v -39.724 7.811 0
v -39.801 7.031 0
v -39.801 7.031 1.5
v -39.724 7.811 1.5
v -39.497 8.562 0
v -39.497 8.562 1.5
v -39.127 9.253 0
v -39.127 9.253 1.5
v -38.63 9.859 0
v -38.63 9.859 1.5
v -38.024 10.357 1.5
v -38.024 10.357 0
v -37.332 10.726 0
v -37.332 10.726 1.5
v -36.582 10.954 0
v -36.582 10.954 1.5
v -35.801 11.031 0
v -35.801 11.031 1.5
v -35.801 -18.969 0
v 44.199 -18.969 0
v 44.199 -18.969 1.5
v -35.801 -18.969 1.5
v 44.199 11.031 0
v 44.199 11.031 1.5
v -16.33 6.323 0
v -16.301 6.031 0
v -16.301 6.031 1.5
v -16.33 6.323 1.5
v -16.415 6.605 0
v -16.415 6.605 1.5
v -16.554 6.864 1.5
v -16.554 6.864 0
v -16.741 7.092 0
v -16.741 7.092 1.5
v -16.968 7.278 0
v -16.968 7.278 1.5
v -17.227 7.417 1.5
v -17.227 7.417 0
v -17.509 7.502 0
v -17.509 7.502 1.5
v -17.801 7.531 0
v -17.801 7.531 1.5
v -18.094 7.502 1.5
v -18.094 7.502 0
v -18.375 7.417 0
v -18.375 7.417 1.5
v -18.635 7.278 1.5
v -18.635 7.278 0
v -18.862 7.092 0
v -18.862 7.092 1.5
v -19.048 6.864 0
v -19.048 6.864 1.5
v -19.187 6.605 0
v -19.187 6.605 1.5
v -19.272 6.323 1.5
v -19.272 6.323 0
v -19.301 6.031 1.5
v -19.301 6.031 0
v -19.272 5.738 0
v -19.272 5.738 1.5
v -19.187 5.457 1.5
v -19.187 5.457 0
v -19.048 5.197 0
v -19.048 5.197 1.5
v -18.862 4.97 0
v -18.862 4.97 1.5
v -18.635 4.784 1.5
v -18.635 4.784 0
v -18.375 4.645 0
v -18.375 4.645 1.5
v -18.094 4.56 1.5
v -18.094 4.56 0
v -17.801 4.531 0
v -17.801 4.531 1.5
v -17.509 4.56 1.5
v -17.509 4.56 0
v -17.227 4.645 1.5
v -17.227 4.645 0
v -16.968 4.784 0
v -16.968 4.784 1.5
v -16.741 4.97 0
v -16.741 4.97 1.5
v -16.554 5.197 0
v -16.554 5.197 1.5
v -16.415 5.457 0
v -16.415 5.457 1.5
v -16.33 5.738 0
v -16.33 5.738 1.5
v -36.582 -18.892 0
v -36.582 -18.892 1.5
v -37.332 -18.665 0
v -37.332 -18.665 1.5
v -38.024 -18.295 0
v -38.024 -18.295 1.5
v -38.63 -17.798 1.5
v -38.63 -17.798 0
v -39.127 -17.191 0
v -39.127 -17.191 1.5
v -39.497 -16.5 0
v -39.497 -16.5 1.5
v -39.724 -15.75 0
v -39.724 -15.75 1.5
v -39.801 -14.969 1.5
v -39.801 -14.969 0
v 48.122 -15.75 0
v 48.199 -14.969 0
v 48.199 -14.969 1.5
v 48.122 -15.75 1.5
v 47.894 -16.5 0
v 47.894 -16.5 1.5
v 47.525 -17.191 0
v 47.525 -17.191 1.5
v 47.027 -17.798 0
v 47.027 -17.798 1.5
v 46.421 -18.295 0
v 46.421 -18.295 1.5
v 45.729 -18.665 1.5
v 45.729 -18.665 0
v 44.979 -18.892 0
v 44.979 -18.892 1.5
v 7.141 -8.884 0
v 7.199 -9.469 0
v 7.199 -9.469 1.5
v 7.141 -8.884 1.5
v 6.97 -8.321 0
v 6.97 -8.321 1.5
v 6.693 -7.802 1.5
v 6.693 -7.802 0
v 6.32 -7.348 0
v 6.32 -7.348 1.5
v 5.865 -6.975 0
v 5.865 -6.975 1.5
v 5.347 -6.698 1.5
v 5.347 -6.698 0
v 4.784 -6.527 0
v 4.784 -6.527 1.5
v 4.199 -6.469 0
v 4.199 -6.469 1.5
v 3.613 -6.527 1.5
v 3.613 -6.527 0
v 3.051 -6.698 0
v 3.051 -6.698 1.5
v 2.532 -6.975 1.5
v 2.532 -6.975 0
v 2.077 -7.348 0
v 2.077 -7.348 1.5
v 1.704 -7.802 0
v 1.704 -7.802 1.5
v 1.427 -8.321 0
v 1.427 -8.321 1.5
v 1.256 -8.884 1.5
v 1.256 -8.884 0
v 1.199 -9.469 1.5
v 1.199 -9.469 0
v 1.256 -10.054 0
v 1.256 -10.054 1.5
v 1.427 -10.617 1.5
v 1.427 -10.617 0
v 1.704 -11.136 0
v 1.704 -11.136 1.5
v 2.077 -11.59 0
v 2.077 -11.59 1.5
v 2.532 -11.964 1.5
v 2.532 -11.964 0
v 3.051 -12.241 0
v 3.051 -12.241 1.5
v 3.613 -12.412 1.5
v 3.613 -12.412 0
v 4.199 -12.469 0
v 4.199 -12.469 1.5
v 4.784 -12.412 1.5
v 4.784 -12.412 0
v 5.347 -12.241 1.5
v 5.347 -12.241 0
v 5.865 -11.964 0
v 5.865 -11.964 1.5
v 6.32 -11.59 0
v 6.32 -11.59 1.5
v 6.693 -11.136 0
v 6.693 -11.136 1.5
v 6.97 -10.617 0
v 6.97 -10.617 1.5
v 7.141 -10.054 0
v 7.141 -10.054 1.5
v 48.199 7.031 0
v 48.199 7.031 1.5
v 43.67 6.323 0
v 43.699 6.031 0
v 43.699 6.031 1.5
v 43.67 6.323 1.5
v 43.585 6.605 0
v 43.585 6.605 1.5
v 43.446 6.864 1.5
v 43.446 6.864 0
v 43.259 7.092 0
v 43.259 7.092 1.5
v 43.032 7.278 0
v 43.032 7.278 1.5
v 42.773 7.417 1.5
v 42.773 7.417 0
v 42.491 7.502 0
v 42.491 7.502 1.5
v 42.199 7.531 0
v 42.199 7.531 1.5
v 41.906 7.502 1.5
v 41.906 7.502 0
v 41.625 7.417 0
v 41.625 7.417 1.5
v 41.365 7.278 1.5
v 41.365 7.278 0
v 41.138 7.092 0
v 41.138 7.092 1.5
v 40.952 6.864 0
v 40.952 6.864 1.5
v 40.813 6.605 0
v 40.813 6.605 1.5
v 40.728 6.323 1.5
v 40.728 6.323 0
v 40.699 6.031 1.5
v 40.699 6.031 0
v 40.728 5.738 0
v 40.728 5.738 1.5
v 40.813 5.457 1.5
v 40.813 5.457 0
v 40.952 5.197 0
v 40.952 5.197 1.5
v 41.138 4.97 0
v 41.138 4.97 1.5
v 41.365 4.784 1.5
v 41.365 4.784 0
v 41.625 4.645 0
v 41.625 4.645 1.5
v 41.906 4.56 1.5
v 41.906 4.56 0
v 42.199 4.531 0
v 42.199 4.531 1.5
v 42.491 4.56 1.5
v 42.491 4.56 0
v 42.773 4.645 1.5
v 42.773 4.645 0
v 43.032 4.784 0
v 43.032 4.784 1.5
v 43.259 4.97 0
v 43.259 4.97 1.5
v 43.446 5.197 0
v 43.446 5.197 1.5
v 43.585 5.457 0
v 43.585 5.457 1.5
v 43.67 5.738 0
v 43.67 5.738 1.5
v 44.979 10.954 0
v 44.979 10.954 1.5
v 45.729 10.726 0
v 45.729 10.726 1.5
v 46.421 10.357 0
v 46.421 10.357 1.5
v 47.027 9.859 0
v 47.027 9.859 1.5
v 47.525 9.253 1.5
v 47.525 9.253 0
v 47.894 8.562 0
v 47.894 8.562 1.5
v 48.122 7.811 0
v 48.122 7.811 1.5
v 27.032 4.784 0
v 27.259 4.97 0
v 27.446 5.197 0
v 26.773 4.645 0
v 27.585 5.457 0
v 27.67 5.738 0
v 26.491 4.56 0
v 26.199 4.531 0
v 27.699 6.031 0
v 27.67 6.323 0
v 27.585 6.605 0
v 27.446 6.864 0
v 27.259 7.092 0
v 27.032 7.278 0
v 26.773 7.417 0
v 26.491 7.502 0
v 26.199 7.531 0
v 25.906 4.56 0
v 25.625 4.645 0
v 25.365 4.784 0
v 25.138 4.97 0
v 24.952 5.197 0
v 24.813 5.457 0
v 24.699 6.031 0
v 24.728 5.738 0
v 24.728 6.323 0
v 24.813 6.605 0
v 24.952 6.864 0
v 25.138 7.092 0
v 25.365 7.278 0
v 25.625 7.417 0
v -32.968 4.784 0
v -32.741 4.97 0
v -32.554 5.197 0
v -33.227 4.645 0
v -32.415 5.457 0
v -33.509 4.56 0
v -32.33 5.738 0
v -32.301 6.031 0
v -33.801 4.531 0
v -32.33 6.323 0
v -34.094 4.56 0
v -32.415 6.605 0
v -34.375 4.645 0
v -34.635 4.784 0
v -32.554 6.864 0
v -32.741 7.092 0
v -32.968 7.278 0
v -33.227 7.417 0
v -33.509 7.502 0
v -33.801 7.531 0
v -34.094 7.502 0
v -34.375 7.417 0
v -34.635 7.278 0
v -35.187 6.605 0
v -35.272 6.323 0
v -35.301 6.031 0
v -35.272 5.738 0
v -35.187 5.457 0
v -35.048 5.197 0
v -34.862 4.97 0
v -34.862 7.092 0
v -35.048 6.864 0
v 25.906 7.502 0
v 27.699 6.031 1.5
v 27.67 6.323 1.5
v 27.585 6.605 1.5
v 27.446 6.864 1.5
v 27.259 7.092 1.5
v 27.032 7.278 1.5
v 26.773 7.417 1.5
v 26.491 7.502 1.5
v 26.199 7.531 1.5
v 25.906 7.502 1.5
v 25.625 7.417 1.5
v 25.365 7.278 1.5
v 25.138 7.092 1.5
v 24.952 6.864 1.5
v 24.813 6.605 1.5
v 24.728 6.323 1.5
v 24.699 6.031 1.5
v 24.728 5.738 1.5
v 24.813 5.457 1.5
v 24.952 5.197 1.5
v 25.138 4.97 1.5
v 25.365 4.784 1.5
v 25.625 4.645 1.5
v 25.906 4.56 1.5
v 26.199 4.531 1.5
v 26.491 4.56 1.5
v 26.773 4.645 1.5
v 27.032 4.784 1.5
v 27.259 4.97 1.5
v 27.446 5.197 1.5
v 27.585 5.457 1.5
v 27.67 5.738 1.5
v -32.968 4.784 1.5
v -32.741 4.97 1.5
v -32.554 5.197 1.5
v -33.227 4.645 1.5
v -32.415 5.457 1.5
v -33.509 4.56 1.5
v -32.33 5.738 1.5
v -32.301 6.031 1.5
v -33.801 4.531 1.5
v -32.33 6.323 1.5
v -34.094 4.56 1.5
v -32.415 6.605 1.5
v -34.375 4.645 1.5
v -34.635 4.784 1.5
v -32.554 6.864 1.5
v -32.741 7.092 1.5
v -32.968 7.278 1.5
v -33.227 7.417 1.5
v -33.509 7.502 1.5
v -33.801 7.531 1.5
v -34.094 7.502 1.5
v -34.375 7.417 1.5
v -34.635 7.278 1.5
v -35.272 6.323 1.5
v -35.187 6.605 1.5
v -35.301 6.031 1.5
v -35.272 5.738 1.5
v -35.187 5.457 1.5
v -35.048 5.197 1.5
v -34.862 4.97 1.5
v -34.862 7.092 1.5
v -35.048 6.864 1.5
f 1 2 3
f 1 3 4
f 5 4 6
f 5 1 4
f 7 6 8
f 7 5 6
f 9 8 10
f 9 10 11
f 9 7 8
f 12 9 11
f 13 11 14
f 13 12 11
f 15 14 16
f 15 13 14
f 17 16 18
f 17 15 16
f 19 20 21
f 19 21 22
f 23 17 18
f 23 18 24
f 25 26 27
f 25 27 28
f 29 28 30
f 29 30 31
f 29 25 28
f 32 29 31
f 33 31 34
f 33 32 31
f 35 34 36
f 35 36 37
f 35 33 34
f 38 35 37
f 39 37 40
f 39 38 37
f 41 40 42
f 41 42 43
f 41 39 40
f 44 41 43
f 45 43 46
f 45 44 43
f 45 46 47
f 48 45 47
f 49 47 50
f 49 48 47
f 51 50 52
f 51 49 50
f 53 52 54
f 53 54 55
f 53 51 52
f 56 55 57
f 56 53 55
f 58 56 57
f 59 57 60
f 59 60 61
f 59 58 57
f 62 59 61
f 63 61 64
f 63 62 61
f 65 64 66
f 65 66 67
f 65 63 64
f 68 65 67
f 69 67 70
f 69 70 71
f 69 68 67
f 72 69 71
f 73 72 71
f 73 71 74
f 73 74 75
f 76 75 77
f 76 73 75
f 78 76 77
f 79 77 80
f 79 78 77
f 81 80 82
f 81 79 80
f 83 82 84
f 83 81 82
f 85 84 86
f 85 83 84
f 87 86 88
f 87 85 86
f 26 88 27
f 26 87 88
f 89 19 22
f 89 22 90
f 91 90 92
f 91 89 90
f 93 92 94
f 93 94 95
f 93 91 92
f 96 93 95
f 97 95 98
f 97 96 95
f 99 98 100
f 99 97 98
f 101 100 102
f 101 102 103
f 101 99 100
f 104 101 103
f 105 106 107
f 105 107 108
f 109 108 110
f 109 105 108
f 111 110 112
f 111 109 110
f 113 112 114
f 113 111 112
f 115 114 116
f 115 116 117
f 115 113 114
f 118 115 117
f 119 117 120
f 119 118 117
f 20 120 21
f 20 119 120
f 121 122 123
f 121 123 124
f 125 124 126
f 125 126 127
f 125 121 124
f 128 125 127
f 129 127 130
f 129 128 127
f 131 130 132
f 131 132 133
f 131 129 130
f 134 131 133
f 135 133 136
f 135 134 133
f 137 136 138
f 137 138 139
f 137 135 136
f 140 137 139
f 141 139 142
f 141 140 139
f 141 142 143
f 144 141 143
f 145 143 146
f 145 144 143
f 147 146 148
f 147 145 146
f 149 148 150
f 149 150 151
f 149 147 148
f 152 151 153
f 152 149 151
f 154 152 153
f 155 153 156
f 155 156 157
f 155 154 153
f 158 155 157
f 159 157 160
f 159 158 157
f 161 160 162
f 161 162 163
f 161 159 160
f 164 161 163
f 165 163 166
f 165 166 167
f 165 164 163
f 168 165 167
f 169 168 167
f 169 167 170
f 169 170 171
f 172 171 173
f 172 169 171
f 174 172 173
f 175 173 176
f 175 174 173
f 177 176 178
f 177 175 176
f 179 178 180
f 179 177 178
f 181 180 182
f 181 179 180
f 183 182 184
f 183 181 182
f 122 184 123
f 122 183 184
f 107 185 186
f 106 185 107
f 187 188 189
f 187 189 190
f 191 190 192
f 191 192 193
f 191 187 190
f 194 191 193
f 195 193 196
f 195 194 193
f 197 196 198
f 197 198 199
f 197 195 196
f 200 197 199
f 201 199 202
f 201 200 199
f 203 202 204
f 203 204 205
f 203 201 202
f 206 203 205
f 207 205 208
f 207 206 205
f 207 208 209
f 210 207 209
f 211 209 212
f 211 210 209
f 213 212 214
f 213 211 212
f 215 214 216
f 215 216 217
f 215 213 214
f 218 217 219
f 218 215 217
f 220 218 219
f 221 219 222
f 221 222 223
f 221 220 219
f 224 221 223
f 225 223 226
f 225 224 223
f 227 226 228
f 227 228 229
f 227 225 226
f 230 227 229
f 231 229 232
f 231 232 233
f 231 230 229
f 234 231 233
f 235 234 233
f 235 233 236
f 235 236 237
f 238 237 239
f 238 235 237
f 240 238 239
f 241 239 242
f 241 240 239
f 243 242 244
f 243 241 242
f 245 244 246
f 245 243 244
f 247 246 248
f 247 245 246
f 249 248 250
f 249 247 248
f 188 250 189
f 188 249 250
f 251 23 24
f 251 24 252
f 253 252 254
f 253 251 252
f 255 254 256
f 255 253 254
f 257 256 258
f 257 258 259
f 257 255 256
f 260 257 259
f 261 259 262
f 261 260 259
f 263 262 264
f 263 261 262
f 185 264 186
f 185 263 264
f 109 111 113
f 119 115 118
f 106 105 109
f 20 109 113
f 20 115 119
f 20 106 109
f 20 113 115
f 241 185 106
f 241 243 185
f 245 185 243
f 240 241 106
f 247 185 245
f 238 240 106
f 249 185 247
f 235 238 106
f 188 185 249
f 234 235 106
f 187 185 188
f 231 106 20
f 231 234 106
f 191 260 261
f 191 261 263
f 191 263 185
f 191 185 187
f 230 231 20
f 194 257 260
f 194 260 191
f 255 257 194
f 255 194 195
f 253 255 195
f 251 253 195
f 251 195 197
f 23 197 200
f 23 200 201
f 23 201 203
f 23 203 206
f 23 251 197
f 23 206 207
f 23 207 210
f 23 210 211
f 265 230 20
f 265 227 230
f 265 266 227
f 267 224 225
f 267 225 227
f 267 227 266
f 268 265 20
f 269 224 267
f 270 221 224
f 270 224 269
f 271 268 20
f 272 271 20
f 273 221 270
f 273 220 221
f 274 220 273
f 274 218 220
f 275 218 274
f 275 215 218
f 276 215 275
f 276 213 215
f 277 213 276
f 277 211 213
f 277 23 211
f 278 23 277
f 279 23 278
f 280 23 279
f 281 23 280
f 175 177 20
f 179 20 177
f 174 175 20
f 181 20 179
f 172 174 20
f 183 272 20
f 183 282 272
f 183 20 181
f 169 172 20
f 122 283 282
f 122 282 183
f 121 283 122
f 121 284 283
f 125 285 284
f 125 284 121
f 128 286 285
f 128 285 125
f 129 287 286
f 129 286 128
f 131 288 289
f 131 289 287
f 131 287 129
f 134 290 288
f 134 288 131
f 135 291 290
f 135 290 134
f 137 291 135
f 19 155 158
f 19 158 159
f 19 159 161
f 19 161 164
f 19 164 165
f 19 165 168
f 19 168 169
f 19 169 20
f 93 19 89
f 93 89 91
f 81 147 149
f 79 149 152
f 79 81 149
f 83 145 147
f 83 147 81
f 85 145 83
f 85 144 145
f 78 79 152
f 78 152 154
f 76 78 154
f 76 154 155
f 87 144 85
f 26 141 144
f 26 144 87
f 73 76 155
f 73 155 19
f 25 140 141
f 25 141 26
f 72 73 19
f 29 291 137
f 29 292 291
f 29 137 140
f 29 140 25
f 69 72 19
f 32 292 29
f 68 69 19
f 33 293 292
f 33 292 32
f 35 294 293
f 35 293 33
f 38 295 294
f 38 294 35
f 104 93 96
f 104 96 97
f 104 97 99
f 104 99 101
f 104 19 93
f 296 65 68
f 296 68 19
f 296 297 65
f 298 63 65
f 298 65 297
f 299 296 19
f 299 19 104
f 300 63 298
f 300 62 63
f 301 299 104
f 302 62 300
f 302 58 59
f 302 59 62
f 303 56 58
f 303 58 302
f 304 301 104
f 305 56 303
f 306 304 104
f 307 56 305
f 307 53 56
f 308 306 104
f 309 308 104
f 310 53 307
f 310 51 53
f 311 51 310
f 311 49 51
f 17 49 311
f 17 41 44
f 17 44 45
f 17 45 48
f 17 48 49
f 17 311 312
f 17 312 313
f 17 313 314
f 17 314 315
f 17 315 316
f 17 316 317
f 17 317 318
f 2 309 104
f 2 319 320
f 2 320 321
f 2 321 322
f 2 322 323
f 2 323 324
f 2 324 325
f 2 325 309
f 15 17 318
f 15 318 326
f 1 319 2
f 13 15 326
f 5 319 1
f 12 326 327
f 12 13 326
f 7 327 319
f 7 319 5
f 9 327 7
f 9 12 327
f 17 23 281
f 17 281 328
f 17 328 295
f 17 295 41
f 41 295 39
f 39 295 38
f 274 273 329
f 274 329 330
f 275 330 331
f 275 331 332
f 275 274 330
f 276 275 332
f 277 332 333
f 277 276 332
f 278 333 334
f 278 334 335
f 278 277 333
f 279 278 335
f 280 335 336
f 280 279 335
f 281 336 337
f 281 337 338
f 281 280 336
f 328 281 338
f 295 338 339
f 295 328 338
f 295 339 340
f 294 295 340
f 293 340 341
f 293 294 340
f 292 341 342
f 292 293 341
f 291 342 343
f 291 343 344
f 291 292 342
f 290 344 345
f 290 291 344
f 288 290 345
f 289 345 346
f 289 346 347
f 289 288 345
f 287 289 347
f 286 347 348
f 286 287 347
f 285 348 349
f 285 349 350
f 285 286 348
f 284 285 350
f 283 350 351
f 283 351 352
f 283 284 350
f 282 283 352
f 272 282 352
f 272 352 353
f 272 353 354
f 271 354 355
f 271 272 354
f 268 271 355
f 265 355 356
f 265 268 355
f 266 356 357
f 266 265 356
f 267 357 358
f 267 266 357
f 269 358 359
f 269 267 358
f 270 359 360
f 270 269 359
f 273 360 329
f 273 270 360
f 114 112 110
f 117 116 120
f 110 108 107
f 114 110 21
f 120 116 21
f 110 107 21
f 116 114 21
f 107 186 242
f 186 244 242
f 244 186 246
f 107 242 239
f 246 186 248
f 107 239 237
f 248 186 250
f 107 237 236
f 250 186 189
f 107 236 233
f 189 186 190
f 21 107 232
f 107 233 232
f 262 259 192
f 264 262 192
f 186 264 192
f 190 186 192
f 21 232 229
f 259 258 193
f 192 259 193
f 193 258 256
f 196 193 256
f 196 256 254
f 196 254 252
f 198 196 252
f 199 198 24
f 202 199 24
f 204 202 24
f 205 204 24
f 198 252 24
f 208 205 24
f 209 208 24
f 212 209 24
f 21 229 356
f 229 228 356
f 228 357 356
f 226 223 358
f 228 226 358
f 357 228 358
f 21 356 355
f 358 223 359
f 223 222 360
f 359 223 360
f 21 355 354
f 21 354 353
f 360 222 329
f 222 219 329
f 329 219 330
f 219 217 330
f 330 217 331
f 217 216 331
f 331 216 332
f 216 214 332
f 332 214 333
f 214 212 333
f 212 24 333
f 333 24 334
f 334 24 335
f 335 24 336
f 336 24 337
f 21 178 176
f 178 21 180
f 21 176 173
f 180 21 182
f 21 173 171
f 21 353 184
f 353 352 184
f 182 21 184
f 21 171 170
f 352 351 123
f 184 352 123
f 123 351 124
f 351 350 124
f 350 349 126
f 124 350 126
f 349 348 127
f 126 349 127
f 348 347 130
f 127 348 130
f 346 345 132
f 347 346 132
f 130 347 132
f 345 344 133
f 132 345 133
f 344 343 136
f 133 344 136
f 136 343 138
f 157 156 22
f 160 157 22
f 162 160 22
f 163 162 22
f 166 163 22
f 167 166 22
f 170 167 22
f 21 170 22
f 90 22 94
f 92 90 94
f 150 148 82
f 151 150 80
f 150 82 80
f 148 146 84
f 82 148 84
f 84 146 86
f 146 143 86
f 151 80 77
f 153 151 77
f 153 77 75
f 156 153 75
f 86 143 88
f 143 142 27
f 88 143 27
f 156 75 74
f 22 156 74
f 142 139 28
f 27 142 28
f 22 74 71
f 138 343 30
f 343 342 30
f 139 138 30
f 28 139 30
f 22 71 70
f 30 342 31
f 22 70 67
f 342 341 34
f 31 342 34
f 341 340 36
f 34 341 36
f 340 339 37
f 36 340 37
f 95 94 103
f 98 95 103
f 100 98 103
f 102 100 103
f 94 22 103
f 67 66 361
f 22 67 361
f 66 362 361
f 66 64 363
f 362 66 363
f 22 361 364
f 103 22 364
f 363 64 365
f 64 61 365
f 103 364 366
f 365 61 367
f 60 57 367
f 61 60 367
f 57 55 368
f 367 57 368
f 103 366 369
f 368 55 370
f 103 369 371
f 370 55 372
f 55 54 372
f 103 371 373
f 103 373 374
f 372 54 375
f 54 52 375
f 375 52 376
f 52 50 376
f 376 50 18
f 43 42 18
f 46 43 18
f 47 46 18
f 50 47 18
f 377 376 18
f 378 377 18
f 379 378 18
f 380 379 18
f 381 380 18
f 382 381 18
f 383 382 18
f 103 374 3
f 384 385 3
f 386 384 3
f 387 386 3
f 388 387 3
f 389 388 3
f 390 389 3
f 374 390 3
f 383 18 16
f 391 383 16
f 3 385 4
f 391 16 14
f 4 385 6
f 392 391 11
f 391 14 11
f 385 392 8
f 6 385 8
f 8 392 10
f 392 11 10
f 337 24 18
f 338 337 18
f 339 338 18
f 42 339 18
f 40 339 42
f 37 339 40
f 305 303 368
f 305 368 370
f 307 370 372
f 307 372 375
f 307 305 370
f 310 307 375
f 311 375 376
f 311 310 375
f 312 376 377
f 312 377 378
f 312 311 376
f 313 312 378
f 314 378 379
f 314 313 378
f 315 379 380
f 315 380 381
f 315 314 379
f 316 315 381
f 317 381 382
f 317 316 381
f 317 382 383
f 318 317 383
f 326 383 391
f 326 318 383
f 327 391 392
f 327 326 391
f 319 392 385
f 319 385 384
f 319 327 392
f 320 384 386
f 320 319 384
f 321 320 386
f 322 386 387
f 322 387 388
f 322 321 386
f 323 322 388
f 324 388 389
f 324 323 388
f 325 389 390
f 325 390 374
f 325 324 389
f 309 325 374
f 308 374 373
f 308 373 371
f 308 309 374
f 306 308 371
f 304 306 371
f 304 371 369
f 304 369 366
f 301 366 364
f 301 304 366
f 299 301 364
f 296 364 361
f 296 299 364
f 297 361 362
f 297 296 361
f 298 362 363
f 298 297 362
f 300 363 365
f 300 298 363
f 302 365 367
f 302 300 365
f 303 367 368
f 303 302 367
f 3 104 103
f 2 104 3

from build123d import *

# Parameters (mm, degrees)
SKETCH_1_R      = 3
SKETCH_1_R_2    = 1.5
EXTRUDE_1_DEPTH = 1.5


with BuildPart() as part:
    # 草图1 → 凸台-拉伸1 (new body)
    with BuildSketch(Plane.XY):
        with BuildLine():
            Line((-25.801260856, 11.030846734), (34.198739144, 11.030846734))
            Line((34.198739144, 11.030846734), (44.198739144, 11.030846734))
            ThreePointArc((44.198739144, 11.030846734), (47.027166269, 9.859273858), (48.198739144, 7.030846734))
            Line((48.198739144, 7.030846734), (48.198739144, -14.969153266))
            ThreePointArc((48.198739144, -14.969153266), (47.027166269, -17.797580391), (44.198739144, -18.969153266))
            Line((44.198739144, -18.969153266), (34.198739144, -18.969153266))
            Line((34.198739144, -18.969153266), (-25.801260856, -18.969153266))
            Line((-25.801260856, -18.969153266), (-35.801260856, -18.969153266))
            ThreePointArc((-35.801260856, -18.969153266), (-38.62968798, -17.797580391), (-39.801260856, -14.969153266))
            Line((-39.801260856, -14.969153266), (-39.801260856, 7.030846734))
            ThreePointArc((-39.801260856, 7.030846734), (-38.62968798, 9.859273858), (-35.801260856, 11.030846734))
            Line((-35.801260856, 11.030846734), (-25.801260856, 11.030846734))
        make_face()
        with Locations((4.198739144, -9.469153266)):
            Circle(SKETCH_1_R, mode=Mode.SUBTRACT)
        with Locations((-17.801260856, 6.030846734)):
            Circle(SKETCH_1_R_2, mode=Mode.SUBTRACT)
        with Locations((-33.801260856, 6.030846734)):
            Circle(SKETCH_1_R_2, mode=Mode.SUBTRACT)
        with Locations((26.198739144, 6.030846734)):
            Circle(SKETCH_1_R_2, mode=Mode.SUBTRACT)
        with Locations((42.198739144, 6.030846734)):
            Circle(SKETCH_1_R_2, mode=Mode.SUBTRACT)
    extrude(amount=EXTRUDE_1_DEPTH)


solid = part.part
